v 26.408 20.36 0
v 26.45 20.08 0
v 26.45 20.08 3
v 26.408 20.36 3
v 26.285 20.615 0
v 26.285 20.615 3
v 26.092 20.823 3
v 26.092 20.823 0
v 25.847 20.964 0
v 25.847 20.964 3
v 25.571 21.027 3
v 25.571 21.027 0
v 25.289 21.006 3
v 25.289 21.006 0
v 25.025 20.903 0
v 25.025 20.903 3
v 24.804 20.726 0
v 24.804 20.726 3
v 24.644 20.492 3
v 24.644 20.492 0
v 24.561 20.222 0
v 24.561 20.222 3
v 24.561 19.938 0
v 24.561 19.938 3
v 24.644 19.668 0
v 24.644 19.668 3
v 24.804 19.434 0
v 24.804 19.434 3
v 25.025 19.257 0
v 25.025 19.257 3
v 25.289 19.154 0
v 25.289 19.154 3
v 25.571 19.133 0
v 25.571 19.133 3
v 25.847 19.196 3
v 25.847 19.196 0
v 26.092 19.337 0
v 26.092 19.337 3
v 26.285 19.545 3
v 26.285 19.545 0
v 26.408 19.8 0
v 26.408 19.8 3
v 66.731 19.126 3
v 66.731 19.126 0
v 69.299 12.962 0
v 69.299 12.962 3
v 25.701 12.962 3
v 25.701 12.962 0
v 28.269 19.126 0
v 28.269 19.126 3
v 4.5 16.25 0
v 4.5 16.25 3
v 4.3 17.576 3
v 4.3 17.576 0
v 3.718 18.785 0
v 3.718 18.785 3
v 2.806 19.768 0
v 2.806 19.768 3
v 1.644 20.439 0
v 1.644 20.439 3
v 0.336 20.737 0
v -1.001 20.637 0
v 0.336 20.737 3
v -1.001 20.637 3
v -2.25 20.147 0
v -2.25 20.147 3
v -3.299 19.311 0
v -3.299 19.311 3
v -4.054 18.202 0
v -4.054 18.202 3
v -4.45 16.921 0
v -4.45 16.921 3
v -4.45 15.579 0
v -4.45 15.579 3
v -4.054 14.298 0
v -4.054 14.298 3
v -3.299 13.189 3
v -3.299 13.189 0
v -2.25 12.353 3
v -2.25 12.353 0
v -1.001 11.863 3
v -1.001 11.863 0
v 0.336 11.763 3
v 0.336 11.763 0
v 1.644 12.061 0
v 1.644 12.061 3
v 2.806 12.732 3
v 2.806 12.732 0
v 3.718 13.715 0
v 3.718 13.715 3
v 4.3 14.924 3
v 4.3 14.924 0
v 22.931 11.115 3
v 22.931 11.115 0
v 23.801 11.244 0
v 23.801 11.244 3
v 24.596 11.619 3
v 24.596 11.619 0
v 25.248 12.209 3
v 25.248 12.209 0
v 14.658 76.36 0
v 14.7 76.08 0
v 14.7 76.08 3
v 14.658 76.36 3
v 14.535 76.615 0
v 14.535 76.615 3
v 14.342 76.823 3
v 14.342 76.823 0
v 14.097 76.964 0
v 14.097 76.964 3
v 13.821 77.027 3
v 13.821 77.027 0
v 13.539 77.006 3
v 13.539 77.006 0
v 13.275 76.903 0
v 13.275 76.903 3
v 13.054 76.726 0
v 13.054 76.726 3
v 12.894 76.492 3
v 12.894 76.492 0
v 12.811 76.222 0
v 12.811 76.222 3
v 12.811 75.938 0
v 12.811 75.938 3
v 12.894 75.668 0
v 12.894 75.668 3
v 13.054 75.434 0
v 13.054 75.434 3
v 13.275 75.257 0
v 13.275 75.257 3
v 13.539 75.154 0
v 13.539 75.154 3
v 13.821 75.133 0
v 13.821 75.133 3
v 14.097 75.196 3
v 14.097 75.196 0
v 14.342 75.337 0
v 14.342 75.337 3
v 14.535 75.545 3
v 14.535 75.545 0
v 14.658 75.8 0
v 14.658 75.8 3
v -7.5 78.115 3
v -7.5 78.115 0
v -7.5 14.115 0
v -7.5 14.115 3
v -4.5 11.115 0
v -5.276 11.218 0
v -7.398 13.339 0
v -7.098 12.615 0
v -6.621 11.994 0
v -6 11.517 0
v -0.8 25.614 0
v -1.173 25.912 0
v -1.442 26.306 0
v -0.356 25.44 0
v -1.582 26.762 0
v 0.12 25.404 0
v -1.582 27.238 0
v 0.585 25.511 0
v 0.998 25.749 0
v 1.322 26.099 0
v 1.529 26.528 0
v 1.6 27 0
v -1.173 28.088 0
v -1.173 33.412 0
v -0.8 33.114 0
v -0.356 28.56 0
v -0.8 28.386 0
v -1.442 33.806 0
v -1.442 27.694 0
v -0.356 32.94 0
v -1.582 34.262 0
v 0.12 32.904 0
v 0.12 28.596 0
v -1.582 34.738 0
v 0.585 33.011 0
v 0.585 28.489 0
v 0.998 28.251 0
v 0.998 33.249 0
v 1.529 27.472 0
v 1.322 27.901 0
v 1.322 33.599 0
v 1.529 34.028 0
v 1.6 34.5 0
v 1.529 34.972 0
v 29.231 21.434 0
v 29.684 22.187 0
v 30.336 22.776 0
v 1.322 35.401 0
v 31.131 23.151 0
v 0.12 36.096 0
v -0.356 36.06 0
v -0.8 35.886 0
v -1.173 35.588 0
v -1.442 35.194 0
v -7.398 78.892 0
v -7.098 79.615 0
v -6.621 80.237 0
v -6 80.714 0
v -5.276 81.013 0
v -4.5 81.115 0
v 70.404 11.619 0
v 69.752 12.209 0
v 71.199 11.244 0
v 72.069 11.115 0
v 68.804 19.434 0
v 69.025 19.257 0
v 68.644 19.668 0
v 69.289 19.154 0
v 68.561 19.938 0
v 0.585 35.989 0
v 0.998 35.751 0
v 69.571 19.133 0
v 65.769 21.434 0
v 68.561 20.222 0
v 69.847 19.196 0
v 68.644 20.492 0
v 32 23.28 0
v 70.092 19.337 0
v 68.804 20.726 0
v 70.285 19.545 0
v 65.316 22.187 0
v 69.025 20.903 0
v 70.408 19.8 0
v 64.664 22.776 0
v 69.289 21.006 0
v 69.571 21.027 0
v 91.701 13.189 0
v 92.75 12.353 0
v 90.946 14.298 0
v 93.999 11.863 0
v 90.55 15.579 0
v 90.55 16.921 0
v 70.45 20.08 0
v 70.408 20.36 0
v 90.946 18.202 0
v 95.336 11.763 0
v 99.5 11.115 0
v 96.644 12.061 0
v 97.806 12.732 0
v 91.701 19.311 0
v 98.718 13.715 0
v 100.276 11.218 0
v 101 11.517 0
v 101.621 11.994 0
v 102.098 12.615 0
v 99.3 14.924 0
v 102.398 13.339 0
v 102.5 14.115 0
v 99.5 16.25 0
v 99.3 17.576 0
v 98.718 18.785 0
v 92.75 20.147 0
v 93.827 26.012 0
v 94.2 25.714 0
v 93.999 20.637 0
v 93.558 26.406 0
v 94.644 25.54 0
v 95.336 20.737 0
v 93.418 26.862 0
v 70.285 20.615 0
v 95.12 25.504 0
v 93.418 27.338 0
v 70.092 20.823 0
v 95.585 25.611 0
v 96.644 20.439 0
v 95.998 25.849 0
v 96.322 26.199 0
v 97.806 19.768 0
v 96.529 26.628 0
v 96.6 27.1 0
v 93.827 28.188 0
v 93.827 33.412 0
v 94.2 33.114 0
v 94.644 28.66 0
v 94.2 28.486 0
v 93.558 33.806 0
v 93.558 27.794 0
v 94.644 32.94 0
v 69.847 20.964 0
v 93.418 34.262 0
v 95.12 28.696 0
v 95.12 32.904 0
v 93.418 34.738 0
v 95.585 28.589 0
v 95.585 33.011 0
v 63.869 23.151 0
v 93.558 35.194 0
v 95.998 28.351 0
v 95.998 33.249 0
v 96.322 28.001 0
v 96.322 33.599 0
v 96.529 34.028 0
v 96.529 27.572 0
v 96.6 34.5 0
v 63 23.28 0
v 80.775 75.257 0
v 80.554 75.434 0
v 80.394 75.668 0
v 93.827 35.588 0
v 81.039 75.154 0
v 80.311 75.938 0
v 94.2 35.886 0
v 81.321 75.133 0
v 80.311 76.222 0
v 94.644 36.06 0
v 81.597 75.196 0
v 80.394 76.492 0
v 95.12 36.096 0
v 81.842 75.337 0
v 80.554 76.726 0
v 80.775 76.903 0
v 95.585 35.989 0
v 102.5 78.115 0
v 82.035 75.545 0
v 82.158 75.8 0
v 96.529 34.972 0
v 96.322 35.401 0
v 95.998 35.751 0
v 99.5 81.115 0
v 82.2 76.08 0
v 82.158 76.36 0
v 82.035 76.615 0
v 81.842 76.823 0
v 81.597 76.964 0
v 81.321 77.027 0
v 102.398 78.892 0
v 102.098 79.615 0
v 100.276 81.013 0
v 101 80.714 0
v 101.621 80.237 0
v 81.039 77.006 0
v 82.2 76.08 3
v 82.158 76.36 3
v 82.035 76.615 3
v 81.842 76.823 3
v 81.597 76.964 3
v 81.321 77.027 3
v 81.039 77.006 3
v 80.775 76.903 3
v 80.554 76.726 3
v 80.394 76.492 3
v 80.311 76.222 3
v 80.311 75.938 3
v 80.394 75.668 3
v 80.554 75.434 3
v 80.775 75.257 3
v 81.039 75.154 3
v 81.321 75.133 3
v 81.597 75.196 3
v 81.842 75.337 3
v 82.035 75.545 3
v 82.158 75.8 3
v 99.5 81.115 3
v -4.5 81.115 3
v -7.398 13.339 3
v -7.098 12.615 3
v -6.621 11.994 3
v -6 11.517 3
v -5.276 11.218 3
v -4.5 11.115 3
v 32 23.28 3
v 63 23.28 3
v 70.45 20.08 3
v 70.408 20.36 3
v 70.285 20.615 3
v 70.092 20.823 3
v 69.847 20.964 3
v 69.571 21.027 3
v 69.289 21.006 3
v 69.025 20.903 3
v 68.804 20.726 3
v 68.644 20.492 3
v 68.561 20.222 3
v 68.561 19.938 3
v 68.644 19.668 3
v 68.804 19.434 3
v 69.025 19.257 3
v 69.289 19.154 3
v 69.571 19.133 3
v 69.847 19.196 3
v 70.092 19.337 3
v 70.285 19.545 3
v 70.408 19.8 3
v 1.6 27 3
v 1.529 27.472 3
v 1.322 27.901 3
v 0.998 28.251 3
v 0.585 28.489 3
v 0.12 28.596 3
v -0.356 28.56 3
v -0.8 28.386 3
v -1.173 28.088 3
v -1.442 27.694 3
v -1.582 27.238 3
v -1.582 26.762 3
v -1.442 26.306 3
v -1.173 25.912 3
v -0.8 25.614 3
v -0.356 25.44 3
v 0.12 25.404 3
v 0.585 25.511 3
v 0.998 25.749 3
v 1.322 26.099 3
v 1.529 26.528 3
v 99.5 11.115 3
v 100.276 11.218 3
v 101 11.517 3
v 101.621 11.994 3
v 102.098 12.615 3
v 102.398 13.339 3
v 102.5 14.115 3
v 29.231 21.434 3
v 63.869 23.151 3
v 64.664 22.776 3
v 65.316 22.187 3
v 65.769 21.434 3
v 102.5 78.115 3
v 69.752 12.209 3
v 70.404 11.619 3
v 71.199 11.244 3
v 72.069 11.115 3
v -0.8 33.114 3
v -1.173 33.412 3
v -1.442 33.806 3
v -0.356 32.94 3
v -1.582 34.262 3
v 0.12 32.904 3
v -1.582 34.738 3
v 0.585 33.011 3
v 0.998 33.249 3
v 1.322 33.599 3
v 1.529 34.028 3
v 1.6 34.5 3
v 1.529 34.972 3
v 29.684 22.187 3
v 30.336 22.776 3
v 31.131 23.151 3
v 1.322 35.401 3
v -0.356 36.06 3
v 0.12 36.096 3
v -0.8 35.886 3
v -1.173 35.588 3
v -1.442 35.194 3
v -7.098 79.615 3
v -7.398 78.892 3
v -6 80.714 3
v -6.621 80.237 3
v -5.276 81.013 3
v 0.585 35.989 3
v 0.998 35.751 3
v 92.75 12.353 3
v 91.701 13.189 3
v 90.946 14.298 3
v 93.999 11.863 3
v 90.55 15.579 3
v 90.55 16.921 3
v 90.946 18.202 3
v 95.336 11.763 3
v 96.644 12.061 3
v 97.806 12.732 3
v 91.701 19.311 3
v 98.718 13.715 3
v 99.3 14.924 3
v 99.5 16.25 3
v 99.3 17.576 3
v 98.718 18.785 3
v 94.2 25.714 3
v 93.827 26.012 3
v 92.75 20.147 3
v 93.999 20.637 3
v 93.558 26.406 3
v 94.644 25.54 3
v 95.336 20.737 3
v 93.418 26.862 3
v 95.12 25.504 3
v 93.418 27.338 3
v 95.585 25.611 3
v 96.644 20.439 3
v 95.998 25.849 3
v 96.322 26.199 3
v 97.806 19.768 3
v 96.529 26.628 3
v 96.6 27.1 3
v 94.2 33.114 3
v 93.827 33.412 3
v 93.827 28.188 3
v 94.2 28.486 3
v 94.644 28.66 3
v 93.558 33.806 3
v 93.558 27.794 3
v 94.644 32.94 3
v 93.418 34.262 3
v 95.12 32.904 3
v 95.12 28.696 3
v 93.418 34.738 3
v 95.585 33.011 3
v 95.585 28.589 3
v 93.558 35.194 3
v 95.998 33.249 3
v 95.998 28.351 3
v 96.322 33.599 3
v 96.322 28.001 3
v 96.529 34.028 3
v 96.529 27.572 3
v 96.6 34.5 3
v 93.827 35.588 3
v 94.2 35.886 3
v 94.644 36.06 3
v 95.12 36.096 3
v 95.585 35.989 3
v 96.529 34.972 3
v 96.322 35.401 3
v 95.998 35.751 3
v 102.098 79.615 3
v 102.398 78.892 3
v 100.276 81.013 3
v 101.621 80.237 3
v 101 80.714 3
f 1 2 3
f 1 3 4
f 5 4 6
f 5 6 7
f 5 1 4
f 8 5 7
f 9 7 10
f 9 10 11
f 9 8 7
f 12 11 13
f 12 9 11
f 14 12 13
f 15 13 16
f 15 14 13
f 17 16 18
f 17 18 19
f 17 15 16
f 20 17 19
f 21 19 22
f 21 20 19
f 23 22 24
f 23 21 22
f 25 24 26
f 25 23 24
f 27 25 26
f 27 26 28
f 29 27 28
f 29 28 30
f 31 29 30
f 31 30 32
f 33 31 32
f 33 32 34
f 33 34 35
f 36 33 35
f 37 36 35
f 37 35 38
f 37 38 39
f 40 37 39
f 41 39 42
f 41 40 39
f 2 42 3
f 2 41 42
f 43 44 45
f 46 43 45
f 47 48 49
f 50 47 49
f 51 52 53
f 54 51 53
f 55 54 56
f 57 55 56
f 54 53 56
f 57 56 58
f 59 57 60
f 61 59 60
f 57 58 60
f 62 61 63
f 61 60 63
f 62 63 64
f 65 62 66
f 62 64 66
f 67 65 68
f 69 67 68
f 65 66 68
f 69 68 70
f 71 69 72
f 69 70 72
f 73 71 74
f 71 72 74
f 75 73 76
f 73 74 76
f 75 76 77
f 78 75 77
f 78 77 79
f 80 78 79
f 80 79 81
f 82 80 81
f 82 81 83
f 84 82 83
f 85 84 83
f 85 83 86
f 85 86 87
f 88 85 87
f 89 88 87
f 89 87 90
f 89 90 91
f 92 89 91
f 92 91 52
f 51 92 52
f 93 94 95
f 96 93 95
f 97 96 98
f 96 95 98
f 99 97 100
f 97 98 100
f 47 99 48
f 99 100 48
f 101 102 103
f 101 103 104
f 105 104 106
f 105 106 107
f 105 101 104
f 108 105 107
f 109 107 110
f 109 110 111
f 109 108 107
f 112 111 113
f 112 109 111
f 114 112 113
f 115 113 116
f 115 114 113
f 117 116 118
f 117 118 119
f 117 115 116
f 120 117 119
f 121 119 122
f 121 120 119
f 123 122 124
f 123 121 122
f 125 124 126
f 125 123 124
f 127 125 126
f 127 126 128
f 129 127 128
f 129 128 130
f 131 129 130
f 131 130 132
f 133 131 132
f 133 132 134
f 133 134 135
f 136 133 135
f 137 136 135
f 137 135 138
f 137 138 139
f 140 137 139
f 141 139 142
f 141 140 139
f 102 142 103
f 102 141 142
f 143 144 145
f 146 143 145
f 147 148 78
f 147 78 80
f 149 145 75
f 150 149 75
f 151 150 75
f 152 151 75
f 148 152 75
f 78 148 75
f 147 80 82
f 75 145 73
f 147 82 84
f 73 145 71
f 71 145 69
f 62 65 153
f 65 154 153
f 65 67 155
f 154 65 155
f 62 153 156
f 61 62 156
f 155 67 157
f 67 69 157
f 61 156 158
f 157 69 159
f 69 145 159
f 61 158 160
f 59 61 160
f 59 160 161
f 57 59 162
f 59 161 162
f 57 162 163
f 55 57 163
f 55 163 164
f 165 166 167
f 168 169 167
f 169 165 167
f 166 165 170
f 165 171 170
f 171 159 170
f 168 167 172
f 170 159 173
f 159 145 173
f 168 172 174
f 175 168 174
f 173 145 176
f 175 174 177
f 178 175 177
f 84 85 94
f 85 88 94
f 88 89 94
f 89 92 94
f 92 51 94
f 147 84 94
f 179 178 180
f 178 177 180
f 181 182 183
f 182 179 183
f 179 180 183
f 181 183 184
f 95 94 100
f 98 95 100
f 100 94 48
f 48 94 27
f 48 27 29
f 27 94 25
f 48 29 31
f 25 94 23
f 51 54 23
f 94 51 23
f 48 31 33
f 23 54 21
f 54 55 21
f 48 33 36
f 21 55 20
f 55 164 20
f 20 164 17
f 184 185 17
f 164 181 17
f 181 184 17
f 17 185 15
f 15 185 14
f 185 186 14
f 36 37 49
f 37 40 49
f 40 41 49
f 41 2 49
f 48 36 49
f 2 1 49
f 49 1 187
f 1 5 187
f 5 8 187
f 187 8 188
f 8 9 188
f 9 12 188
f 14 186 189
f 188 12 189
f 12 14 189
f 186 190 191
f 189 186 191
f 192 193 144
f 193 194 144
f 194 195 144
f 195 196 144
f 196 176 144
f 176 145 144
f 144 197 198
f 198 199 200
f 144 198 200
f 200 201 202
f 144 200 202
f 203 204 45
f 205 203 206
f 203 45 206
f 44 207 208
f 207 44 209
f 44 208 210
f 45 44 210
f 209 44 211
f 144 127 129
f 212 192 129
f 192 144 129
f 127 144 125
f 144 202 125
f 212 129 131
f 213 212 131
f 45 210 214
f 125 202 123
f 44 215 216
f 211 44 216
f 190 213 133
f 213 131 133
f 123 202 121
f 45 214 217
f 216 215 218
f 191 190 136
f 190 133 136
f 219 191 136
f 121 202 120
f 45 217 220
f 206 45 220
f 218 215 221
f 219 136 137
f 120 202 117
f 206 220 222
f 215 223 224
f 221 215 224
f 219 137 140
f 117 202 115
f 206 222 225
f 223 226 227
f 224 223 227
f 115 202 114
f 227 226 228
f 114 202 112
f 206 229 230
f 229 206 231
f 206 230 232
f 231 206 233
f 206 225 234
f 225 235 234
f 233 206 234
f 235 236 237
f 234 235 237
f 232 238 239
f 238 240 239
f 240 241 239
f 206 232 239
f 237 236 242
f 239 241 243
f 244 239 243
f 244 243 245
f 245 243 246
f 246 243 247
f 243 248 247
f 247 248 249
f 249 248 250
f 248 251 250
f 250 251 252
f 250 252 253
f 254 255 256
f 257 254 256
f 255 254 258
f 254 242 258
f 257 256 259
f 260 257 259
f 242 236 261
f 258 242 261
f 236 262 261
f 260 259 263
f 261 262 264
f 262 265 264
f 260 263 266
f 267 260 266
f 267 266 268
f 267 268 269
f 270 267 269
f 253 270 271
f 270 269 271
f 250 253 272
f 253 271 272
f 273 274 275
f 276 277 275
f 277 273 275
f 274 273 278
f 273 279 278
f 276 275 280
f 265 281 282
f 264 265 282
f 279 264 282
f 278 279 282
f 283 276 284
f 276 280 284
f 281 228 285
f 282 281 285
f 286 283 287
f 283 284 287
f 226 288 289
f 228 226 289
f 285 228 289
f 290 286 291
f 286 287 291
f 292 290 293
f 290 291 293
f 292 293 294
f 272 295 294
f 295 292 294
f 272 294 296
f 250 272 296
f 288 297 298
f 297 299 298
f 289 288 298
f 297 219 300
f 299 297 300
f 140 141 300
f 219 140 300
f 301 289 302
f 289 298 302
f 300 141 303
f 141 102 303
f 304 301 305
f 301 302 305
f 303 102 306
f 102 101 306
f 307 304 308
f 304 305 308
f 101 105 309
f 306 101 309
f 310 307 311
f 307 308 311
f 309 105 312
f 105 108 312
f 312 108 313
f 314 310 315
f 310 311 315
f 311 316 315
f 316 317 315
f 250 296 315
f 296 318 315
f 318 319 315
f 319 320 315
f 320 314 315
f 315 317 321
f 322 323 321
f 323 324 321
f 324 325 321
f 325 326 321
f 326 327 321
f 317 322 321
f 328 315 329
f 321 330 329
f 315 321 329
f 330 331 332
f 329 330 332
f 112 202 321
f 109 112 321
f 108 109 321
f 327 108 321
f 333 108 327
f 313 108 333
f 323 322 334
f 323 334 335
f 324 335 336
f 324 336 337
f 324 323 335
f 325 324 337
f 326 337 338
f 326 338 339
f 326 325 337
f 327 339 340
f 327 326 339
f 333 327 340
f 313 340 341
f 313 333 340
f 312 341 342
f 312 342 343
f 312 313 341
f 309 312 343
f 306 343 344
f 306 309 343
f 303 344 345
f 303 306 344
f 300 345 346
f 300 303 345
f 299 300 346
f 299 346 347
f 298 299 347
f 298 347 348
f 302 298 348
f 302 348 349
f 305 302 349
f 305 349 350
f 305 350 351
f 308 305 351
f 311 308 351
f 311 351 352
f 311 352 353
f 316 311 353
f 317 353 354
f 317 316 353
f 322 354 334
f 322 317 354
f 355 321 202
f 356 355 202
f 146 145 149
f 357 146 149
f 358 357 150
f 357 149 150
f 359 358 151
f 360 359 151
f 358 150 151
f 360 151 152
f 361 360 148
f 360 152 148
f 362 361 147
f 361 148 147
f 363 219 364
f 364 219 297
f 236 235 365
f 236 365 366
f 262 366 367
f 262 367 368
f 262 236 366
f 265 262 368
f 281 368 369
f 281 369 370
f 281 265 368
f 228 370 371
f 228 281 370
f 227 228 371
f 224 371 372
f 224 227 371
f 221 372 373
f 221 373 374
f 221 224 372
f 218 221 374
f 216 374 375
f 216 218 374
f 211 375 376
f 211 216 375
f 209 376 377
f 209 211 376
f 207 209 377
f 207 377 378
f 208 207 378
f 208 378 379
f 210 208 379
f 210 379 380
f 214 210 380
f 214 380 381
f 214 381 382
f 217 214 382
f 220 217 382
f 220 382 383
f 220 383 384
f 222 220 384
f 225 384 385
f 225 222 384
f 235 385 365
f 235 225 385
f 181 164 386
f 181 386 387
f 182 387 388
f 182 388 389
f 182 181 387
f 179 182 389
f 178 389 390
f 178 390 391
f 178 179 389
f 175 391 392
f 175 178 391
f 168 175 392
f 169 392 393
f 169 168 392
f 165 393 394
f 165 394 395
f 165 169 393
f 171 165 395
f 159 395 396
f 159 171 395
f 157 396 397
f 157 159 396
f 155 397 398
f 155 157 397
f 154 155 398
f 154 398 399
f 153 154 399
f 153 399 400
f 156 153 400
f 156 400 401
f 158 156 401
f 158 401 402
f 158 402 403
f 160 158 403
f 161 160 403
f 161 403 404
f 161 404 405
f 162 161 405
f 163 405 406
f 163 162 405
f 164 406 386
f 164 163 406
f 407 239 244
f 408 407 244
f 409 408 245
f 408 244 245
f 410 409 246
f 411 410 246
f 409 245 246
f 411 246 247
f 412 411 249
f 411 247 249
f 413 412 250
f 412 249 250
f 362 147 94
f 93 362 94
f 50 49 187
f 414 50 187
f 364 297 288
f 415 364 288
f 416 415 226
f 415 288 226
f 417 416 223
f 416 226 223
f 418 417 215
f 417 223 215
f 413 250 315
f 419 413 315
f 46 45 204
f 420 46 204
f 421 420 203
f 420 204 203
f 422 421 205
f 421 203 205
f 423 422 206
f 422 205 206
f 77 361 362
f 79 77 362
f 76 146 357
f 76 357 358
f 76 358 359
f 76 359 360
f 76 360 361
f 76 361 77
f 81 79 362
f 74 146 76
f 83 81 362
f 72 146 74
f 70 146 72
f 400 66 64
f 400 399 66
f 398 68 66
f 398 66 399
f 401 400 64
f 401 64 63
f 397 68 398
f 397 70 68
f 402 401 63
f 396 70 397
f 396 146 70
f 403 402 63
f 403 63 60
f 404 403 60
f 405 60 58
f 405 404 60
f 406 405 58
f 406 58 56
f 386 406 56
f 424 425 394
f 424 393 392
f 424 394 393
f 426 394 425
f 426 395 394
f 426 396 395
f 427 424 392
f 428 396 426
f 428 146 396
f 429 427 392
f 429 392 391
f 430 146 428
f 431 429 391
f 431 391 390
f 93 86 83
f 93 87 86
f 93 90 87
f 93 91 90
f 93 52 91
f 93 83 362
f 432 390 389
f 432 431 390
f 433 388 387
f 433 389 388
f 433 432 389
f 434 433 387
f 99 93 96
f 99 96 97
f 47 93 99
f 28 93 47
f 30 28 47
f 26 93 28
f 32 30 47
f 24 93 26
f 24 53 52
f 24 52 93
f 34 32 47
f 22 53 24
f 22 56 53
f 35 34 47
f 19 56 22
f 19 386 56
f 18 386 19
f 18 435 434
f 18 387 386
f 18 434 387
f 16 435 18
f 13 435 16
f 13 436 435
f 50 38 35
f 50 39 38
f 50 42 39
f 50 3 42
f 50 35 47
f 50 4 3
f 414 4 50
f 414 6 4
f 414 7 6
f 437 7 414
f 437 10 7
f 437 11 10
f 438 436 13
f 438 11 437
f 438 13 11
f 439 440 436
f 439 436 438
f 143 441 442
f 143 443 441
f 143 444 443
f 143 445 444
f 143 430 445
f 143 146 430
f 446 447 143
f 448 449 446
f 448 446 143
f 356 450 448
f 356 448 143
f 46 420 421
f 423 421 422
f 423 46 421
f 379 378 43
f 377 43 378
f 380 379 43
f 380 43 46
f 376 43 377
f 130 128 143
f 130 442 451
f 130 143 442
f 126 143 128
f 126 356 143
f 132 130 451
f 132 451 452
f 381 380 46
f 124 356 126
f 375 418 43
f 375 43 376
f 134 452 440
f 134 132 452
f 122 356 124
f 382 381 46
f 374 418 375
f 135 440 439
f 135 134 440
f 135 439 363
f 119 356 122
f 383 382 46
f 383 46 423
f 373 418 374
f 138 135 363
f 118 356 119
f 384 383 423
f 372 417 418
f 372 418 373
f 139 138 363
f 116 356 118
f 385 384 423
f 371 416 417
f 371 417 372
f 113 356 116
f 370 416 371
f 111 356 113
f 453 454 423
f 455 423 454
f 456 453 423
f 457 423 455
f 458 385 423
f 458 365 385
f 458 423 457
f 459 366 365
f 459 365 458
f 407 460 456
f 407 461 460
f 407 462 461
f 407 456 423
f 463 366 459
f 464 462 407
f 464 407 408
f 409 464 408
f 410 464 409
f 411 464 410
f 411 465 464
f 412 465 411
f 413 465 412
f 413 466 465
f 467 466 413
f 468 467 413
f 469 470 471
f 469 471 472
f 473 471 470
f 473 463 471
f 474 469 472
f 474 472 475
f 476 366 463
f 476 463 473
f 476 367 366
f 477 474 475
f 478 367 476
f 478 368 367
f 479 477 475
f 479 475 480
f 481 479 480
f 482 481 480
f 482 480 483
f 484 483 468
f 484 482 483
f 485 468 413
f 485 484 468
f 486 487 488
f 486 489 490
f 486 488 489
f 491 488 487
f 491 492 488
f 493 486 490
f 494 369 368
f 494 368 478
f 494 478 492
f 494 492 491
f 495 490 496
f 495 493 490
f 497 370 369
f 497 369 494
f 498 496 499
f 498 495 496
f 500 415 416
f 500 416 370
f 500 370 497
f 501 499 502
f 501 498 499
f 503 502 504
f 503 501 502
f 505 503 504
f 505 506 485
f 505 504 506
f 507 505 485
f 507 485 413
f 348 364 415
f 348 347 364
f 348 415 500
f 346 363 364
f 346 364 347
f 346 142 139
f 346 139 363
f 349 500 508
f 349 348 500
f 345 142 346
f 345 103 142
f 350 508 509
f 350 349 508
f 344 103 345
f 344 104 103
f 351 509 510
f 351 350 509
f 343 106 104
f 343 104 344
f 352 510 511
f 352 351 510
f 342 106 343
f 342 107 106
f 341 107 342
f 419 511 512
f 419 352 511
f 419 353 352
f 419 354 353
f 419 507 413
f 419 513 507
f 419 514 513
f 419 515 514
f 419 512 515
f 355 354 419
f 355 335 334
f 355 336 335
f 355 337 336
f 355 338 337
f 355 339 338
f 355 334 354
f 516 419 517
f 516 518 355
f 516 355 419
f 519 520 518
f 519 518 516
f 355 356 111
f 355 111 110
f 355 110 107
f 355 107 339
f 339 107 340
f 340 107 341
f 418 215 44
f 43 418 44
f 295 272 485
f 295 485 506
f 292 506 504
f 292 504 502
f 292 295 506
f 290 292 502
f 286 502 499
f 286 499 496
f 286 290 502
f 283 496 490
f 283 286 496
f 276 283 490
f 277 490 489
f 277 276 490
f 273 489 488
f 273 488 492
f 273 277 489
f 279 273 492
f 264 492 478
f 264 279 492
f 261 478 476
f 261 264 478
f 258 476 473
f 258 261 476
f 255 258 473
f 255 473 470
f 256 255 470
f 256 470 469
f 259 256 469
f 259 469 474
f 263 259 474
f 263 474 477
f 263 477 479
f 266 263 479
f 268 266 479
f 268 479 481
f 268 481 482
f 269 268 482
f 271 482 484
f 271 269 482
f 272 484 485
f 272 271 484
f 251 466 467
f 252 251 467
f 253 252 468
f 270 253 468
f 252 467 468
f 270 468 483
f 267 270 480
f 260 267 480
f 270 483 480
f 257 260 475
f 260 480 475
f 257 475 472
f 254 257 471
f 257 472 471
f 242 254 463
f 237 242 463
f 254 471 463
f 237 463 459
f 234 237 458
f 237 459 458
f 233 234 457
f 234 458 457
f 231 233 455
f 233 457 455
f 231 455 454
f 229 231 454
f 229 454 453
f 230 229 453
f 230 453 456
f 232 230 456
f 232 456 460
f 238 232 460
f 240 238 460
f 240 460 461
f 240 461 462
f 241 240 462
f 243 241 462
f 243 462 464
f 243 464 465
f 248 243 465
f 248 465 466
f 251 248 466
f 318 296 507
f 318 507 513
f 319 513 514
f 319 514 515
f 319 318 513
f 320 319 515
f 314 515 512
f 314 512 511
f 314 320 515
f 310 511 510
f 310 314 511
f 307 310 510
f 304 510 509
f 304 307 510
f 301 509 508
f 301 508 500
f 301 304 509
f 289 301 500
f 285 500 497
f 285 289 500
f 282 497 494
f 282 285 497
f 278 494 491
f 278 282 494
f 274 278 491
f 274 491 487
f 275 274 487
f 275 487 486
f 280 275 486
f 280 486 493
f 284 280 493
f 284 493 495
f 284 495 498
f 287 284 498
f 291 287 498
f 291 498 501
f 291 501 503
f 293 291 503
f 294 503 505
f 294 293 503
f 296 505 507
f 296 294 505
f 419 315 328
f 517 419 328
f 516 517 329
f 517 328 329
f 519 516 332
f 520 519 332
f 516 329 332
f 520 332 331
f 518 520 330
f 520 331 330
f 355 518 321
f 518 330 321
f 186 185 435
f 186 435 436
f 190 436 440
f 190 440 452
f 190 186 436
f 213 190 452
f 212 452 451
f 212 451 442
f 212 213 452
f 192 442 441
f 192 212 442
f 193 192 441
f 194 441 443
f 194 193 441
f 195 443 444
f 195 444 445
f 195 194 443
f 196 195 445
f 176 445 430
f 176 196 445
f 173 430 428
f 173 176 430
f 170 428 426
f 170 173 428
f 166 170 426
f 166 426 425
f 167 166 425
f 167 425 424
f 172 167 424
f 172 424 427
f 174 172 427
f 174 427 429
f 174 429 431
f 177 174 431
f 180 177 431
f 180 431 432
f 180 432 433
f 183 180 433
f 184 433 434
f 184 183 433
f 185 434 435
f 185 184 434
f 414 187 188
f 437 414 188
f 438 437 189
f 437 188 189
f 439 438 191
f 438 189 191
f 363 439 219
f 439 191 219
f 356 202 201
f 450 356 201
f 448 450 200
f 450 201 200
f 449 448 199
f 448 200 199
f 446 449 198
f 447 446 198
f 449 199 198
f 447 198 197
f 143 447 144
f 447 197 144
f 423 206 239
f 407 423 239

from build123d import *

# Parameters (mm, degrees)
SKETCH_1_R         = 1.6
SKETCH_1_R_2       = 0.95
EXTRUDE_1_DEPTH    = 3
SKETCH1_R          = 4.5
CUT_EXTRUDE1_DEPTH = 25


with BuildPart() as part:
    # 草图1 → 凸台-拉伸1 (new body)
    with BuildSketch(Plane.XY):
        with BuildLine():
            Line((32, 23.279914581), (63, 23.279914581))
            ThreePointArc((63, 23.279914581), (64.664100589, 22.776065464), (65.769230769, 21.433760735))
            Line((65.769230769, 21.433760735), (66.730769231, 19.126068427))
            Line((66.730769231, 19.126068427), (69.29930559, 12.961581165))
            ThreePointArc((69.29930559, 12.961581165), (70.404435771, 11.619276436), (72.068536359, 11.115427319))
            Line((72.068536359, 11.115427319), (99.5, 11.115427319))
            ThreePointArc((99.5, 11.115427319), (101.621320344, 11.994106975), (102.5, 14.115427319))
            Line((102.5, 14.115427319), (102.5, 78.115427319))
            ThreePointArc((102.5, 78.115427319), (101.621320344, 80.236747662), (99.5, 81.115427319))
            Line((99.5, 81.115427319), (-4.5, 81.115427319))
            ThreePointArc((-4.5, 81.115427319), (-6.621320344, 80.236747662), (-7.5, 78.115427319))
            Line((-7.5, 78.115427319), (-7.5, 14.115427319))
            ThreePointArc((-7.5, 14.115427319), (-6.621320344, 11.994106975), (-4.5, 11.115427319))
            Line((-4.5, 11.115427319), (22.931463641, 11.115427319))
            ThreePointArc((22.931463641, 11.115427319), (24.595564229, 11.619276436), (25.70069441, 12.961581165))
            Line((25.70069441, 12.961581165), (28.269230769, 19.126068427))
            Line((28.269230769, 19.126068427), (29.230769231, 21.433760735))
            ThreePointArc((29.230769231, 21.433760735), (30.335899411, 22.776065464), (32, 23.279914581))
        make_face()
        with Locations((0, 34.5)):
            Circle(SKETCH_1_R, mode=Mode.SUBTRACT)
        with Locations((0, 27)):
            Circle(SKETCH_1_R, mode=Mode.SUBTRACT)
        with Locations((95, 34.5)):
            Circle(SKETCH_1_R, mode=Mode.SUBTRACT)
        with Locations((95, 27.1)):
            Circle(SKETCH_1_R, mode=Mode.SUBTRACT)
        with Locations((13.75, 76.079914581)):
            Circle(SKETCH_1_R_2, mode=Mode.SUBTRACT)
        with Locations((81.25, 76.079914581)):
            Circle(SKETCH_1_R_2, mode=Mode.SUBTRACT)
        with Locations((69.5, 20.079914581)):
            Circle(SKETCH_1_R_2, mode=Mode.SUBTRACT)
        with Locations((25.5, 20.079914581)):
            Circle(SKETCH_1_R_2, mode=Mode.SUBTRACT)
    extrude(amount=EXTRUDE_1_DEPTH)

    # Sketch1 → Cut-Extrude1 (cut)
    with BuildSketch(Plane.XY.offset(3)):
        with Locations((0, 16.25)):
            Circle(SKETCH1_R)
        with Locations((95, 16.25)):
            Circle(SKETCH1_R)
    extrude(amount=-CUT_EXTRUDE1_DEPTH, mode=Mode.SUBTRACT)


solid = part.part
